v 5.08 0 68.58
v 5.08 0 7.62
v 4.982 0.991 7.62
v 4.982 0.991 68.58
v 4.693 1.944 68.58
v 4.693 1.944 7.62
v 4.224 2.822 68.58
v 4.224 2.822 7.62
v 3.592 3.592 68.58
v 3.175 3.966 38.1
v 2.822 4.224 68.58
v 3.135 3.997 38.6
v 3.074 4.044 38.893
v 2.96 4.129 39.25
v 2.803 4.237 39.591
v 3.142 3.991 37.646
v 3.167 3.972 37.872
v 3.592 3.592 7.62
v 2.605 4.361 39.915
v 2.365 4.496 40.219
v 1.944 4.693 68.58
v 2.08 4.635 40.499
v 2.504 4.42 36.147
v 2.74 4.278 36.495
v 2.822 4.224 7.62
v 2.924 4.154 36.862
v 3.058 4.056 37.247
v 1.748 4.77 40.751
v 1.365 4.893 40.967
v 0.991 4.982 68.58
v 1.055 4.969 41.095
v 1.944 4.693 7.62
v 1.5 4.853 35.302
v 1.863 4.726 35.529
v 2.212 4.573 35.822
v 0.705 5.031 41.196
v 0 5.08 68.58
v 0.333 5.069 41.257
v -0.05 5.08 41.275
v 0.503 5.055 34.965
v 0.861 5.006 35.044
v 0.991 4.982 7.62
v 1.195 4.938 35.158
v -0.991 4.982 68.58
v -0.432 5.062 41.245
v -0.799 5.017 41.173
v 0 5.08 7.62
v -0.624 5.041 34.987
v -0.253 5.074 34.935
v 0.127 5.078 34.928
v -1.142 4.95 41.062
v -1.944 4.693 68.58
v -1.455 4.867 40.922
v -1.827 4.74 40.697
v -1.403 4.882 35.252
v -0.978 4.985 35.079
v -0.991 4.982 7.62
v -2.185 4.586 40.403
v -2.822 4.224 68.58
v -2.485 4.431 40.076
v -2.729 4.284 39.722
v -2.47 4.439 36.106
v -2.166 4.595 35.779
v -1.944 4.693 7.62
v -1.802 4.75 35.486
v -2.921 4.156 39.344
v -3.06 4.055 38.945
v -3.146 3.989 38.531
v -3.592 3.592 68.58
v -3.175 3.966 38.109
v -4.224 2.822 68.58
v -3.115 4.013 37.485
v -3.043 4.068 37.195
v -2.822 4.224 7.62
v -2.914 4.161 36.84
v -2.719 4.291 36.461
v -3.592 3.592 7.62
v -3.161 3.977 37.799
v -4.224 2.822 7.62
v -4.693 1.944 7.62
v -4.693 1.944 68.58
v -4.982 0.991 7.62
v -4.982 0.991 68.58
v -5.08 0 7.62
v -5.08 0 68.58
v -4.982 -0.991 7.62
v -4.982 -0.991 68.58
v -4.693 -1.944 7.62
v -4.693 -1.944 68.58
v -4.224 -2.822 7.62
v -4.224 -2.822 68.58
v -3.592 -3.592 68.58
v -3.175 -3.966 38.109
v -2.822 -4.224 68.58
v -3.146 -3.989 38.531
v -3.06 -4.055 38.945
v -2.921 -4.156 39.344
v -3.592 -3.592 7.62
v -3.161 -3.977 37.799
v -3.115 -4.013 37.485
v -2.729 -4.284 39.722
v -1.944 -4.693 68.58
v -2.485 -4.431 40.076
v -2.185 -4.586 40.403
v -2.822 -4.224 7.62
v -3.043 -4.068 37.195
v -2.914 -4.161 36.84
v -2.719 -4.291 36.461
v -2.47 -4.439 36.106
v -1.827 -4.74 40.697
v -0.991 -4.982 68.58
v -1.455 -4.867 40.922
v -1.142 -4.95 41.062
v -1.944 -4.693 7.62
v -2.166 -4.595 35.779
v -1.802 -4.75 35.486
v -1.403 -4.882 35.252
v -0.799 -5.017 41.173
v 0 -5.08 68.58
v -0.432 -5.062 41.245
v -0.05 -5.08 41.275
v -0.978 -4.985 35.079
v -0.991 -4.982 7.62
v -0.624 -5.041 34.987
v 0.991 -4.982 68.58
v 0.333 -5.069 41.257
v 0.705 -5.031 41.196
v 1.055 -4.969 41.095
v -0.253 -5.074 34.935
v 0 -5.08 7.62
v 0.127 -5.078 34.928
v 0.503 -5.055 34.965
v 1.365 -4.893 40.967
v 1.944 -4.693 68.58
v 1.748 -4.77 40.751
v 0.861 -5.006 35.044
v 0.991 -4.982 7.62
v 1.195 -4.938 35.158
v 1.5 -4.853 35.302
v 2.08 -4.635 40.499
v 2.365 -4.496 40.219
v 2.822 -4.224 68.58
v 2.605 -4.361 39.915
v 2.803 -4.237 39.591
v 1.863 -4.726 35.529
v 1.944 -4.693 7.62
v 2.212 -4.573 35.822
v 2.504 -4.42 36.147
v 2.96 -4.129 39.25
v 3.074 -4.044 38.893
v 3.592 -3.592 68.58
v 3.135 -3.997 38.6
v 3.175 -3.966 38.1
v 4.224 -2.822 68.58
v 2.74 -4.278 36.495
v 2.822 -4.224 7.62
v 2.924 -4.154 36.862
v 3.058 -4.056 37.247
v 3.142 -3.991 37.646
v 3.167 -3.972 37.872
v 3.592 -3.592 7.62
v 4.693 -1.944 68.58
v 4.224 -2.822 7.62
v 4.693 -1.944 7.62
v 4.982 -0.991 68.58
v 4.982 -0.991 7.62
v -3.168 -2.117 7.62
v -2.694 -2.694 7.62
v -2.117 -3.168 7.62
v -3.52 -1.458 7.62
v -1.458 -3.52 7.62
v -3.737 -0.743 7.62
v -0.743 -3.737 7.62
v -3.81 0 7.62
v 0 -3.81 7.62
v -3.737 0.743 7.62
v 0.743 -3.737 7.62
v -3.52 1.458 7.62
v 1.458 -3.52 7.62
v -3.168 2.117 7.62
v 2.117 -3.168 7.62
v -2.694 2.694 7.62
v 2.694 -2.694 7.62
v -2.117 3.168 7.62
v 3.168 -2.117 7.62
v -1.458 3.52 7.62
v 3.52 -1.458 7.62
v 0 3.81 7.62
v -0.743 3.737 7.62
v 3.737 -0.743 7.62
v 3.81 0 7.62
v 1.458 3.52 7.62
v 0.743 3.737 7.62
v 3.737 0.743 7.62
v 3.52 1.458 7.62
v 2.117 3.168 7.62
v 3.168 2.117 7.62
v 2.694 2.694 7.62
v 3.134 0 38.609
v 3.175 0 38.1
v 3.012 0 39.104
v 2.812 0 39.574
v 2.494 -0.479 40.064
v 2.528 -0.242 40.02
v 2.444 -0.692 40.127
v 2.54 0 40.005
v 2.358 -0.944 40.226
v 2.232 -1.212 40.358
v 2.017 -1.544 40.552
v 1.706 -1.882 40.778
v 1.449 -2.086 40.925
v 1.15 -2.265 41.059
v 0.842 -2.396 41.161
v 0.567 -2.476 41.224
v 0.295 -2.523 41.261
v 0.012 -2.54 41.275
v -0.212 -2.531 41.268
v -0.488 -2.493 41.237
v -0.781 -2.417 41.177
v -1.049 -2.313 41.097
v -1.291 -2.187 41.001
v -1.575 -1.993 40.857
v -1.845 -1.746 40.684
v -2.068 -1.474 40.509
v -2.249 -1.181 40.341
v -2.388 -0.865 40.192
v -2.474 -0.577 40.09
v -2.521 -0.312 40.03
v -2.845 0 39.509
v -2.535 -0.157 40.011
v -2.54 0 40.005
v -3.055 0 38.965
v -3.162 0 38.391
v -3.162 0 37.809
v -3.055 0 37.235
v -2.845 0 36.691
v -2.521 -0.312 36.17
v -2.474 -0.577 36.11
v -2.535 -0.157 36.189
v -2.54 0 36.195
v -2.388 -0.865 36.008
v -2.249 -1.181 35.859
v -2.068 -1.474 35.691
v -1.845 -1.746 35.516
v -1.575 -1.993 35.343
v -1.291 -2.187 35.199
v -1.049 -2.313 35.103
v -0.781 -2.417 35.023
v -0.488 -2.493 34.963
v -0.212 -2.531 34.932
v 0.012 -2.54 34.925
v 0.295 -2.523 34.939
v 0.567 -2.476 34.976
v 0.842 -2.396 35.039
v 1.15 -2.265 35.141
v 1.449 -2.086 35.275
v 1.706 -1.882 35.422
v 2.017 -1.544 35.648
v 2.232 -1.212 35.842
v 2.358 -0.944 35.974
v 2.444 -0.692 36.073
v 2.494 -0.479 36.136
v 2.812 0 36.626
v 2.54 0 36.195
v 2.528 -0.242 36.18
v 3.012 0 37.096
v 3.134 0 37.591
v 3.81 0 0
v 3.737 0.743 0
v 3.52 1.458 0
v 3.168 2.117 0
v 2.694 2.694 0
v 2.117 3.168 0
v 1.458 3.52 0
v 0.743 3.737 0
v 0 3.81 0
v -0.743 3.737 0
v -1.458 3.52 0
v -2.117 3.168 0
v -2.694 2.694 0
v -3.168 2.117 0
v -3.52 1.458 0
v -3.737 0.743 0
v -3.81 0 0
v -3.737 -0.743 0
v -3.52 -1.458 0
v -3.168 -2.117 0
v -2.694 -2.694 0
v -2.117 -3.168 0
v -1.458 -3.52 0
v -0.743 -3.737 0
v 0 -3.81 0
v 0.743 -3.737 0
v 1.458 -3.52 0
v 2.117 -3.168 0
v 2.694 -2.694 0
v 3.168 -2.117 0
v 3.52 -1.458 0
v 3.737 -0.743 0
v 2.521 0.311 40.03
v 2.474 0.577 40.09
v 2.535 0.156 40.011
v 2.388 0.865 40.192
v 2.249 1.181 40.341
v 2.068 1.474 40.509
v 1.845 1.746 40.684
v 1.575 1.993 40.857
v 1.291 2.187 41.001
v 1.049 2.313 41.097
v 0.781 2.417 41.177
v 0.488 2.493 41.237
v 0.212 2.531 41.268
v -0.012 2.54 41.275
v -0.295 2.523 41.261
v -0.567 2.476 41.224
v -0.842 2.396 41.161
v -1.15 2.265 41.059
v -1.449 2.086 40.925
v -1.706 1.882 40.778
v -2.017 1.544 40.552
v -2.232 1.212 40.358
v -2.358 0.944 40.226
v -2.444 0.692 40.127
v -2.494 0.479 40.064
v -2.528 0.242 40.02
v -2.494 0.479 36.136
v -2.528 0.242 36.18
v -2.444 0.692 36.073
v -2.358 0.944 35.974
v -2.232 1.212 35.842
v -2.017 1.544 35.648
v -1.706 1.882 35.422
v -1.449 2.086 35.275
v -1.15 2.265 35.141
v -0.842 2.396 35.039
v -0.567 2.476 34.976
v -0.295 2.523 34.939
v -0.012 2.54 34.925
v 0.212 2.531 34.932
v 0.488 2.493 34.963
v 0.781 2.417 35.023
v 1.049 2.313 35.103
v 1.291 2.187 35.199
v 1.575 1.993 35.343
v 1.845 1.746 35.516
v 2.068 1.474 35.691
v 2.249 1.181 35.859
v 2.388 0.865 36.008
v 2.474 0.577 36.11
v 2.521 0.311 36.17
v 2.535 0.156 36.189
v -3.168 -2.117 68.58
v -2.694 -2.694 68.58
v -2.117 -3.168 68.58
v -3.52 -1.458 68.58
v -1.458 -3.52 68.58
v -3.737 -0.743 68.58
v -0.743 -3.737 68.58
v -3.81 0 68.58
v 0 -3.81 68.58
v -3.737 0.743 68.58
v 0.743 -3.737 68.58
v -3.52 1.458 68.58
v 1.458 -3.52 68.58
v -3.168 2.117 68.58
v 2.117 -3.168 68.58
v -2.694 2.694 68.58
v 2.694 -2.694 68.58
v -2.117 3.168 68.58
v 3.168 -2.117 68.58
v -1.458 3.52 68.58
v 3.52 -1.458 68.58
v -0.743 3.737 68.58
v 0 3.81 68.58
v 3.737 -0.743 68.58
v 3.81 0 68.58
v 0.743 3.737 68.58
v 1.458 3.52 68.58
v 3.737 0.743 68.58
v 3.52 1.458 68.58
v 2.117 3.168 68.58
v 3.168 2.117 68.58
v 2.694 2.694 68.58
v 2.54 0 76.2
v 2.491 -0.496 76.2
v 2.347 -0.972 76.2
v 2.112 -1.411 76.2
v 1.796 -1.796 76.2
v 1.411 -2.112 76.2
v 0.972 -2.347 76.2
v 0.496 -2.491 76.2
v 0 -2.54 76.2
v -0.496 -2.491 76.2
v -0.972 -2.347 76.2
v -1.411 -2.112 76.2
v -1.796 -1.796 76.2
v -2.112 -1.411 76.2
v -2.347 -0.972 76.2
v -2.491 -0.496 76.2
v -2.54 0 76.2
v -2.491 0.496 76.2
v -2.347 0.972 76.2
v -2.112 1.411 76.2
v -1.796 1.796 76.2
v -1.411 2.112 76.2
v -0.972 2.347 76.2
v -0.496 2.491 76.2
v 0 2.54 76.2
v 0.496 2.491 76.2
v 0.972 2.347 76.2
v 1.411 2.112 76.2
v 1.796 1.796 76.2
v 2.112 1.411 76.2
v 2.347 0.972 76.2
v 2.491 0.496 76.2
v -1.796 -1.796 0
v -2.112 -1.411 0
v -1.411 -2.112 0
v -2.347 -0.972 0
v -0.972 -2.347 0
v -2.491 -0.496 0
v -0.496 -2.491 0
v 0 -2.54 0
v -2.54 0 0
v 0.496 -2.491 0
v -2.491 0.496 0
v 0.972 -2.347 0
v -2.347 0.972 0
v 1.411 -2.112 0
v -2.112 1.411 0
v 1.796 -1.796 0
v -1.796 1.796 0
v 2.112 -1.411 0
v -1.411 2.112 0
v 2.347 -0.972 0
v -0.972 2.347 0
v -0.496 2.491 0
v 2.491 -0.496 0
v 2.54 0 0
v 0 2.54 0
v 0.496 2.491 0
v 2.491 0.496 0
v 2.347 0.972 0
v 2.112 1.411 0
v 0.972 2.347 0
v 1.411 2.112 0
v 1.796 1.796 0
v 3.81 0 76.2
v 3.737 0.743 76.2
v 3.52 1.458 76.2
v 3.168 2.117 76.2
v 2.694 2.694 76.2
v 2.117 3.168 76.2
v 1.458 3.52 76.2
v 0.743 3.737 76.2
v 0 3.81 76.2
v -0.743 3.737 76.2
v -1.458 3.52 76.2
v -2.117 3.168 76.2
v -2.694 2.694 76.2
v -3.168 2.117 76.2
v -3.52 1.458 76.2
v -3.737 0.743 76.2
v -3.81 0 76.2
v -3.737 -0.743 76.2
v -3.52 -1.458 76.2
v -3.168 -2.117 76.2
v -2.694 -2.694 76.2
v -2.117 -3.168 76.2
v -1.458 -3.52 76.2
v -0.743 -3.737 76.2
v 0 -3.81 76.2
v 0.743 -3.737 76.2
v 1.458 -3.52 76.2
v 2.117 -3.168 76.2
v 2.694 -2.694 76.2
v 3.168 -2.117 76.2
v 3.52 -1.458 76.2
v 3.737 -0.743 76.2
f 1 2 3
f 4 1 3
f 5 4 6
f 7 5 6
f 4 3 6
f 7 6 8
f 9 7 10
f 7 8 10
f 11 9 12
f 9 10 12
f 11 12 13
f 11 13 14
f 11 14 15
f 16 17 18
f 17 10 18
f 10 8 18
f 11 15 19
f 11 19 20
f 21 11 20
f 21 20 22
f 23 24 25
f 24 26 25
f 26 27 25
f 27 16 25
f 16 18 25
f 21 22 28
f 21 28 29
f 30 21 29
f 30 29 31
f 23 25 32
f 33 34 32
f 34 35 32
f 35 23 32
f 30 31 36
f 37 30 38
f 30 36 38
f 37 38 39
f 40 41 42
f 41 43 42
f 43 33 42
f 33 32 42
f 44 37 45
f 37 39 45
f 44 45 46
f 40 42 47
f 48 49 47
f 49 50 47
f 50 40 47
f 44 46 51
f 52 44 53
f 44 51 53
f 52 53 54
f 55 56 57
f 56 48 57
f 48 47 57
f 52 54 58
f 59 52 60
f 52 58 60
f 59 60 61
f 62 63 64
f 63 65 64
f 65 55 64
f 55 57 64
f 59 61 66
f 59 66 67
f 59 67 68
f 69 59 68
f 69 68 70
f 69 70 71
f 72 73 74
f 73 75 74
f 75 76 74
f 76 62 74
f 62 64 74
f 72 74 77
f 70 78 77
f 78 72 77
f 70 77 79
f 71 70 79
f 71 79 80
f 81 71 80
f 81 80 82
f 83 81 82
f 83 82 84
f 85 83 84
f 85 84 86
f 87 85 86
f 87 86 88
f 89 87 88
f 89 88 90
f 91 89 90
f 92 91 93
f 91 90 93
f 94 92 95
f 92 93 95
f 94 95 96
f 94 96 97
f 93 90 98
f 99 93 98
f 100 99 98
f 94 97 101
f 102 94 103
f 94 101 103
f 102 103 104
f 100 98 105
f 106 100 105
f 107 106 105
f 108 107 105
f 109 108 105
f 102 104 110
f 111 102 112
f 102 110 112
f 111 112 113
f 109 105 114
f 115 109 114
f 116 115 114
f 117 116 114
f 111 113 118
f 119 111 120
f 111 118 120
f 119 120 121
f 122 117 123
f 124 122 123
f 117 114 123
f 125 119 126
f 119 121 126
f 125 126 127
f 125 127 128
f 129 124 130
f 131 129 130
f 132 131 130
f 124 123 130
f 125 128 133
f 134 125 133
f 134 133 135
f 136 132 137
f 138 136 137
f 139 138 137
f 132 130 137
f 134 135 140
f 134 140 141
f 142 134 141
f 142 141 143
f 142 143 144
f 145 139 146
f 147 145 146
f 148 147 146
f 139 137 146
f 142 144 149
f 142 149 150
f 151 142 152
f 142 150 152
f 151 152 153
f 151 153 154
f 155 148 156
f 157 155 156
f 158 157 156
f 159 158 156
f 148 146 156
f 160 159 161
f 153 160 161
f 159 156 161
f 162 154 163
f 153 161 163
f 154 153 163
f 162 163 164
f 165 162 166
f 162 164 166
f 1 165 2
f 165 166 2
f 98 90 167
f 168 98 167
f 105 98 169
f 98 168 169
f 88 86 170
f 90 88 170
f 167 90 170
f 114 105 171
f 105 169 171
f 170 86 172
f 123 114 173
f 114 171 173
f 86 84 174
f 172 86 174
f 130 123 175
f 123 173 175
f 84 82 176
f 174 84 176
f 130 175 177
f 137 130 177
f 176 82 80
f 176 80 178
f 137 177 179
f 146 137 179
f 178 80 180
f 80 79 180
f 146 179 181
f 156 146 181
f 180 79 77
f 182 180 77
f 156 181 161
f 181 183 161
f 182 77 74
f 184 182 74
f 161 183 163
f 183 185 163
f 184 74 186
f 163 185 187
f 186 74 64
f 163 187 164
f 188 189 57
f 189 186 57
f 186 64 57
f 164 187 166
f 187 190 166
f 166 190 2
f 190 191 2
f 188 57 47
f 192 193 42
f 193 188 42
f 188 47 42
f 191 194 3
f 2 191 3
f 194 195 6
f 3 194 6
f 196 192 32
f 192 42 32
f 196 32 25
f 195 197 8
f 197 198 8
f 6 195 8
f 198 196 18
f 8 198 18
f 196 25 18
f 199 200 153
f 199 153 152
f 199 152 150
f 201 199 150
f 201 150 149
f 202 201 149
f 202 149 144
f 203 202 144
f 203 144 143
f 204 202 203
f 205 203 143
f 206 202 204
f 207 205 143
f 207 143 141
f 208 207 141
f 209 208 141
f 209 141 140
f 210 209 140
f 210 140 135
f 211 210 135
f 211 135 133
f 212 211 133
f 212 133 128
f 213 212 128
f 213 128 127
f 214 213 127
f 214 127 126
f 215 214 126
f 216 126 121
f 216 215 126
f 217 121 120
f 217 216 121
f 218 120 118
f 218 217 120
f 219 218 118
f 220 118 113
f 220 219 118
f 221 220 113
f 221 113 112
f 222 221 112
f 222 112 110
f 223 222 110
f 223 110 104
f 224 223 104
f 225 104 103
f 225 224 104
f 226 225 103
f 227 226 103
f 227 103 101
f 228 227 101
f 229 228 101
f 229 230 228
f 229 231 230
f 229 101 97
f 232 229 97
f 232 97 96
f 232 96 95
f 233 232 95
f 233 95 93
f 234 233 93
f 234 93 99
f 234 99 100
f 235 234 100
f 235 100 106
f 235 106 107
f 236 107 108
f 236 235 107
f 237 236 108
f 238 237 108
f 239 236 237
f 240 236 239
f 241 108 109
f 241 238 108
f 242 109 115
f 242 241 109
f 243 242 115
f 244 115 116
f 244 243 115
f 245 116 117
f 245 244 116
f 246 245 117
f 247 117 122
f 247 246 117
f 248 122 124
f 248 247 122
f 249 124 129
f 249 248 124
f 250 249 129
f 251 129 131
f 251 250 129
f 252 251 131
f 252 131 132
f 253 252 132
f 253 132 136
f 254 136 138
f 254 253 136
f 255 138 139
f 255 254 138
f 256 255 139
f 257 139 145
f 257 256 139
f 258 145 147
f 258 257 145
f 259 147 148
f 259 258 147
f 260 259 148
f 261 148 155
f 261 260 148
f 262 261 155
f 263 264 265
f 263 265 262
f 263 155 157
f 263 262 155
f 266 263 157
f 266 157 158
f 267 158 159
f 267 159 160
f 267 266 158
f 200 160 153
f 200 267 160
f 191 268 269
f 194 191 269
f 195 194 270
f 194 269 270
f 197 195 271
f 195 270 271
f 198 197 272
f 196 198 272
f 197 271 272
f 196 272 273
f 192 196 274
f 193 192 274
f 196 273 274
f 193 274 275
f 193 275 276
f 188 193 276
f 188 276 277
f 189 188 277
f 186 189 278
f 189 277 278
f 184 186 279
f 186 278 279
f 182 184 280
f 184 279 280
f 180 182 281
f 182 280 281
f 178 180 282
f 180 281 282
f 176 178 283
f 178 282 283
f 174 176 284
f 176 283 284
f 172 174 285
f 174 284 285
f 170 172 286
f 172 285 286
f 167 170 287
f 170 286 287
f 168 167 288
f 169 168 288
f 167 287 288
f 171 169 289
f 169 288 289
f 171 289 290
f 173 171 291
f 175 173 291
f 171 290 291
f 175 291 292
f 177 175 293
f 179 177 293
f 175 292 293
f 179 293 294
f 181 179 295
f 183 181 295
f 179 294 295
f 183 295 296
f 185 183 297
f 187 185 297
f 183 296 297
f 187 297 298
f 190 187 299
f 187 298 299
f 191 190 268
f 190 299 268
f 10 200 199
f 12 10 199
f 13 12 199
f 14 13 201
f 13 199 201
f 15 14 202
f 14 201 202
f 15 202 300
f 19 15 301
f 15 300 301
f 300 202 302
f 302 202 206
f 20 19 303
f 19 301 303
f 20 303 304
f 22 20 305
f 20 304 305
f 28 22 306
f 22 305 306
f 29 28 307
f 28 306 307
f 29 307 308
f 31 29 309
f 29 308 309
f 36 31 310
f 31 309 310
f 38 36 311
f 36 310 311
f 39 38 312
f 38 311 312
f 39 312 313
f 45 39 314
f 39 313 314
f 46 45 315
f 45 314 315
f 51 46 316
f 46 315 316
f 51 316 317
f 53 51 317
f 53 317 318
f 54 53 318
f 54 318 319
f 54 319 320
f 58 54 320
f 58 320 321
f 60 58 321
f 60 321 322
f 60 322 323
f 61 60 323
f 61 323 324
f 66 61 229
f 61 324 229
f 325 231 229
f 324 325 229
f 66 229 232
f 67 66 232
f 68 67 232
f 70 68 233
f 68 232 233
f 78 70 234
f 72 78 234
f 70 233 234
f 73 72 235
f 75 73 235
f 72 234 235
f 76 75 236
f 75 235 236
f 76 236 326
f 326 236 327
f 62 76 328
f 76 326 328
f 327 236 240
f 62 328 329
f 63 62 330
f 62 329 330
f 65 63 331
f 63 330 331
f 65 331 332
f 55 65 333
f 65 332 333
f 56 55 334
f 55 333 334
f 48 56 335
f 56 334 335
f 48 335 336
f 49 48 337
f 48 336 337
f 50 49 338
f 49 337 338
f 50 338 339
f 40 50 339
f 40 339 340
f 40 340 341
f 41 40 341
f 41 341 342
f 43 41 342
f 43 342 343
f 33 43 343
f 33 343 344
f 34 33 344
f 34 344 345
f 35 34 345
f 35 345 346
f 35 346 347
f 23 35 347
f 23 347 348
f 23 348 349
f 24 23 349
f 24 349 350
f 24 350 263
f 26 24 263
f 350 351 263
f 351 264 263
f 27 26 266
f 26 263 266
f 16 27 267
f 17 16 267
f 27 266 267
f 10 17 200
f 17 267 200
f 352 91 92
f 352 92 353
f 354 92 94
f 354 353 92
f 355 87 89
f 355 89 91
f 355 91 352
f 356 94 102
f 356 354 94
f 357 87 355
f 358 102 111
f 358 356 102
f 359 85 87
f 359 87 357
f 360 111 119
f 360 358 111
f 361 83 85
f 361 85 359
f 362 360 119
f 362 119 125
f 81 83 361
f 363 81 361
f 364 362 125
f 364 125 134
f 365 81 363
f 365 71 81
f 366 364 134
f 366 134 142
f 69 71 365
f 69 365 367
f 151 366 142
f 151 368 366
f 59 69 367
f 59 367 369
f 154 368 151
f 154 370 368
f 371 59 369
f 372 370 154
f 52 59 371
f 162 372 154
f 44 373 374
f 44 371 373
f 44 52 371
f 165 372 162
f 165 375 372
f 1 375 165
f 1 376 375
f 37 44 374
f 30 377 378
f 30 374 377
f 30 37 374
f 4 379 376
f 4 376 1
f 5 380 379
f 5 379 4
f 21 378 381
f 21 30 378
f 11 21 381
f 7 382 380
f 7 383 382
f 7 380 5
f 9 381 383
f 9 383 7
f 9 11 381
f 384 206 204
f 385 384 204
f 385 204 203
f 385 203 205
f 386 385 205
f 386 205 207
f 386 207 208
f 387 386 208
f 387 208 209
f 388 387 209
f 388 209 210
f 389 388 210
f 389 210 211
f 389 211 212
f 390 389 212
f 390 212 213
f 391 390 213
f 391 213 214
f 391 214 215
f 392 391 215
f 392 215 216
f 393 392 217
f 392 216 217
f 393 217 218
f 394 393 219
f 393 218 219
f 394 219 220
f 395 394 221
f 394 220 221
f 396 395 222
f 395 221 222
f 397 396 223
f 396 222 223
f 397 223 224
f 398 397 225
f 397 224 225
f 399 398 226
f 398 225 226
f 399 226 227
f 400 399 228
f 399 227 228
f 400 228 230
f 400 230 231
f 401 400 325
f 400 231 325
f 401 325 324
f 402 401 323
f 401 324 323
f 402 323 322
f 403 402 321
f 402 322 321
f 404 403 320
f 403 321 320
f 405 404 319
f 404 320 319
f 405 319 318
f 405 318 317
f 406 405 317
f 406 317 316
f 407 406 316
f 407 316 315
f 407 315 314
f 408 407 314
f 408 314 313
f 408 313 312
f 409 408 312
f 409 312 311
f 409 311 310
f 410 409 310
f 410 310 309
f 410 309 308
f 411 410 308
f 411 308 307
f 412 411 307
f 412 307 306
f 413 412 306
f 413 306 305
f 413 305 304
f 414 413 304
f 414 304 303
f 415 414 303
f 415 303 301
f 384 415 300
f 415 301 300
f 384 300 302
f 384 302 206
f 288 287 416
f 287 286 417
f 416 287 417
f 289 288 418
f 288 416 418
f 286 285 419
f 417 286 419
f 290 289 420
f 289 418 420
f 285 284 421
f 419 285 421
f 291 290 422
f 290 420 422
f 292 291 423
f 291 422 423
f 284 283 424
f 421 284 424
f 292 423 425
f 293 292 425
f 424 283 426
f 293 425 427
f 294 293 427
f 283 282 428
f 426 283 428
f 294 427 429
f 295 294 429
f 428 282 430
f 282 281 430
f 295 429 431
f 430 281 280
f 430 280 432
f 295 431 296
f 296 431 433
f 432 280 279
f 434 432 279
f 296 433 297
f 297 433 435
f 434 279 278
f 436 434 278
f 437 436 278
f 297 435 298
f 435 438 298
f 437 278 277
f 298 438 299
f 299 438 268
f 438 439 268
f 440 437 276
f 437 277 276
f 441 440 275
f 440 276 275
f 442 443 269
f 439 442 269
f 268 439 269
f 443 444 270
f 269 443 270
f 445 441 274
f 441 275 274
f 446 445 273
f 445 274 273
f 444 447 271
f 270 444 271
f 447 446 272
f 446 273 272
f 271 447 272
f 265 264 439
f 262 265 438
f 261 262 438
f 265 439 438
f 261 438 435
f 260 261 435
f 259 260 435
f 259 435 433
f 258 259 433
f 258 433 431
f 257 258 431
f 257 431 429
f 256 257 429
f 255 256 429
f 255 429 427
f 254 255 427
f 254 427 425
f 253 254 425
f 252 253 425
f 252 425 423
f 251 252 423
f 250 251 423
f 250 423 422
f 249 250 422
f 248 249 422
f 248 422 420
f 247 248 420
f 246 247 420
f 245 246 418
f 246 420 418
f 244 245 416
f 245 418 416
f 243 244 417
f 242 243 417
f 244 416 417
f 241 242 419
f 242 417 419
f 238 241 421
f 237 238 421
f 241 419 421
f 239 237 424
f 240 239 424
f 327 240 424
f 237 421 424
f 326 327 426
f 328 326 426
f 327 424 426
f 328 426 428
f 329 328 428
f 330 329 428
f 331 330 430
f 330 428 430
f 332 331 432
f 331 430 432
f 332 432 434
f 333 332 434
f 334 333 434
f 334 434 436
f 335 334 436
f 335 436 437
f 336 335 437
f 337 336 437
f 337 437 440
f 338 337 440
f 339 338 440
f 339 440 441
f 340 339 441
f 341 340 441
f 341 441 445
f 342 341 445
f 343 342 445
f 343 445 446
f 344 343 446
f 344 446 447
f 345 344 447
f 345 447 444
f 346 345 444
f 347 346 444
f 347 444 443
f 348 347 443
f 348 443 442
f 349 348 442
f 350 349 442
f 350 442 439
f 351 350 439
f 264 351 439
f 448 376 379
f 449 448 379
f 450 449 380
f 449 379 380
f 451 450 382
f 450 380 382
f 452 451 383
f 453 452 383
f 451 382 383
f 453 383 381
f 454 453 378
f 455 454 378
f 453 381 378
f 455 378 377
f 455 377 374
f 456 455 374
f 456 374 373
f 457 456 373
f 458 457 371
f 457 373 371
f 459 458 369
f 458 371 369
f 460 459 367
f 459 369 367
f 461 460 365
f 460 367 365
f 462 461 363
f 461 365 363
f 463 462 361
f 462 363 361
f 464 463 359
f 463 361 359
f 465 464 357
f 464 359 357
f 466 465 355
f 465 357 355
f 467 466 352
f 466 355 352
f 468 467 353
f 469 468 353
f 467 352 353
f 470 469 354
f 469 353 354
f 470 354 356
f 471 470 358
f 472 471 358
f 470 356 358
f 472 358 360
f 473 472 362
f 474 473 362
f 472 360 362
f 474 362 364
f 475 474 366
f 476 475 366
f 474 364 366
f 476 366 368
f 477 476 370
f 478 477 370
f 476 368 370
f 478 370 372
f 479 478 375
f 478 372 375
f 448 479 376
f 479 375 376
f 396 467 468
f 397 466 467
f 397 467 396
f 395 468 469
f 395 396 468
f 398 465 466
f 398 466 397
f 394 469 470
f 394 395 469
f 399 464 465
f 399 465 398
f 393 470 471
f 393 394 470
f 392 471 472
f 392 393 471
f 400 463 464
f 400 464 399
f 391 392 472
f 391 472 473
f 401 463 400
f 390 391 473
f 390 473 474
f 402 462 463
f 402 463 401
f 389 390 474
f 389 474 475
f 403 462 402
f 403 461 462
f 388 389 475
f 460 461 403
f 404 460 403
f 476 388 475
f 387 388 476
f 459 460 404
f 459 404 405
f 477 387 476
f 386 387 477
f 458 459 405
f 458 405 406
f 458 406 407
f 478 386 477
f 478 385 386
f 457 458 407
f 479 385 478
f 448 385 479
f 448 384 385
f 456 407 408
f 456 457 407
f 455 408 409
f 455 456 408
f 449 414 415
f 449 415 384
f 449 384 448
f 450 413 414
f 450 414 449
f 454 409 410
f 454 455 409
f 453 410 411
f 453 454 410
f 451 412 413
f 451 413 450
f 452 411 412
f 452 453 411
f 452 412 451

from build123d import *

# Parameters (mm, degrees)
F0_R          = 3.81
F1_DEPTH      = 7.62
F2_R          = 5.08
F3_DEPTH      = 60.96
F4_R          = 3.81
F5_DEPTH      = 7.62
F6_R          = 3.175
F7_DEPTH      = 25.4
F7_DEPTH_BACK = 25.4
F8_R          = 2.54
F9_DEPTH      = 76.201


with BuildPart() as f1:
    # F0 (on Top) → F1 (new body)
    with BuildSketch(Plane.XY):
        Circle(F0_R)
    extrude(amount=F1_DEPTH)

    # F2 (on face) → F3 (join)
    with BuildSketch(Plane.XY.offset(7.62)):
        Circle(F2_R)
    extrude(amount=F3_DEPTH)

    # F4 (on face) → F5 (join)
    with BuildSketch(Plane.XY.offset(68.58)):
        Circle(F4_R)
    extrude(amount=F5_DEPTH)

    # F6 (on Front) → F7 (cut, two sides)
    with BuildSketch(Plane.XZ) as f7_sk:
        with Locations((0, 38.1)):
            Circle(F6_R)
    extrude(amount=-F7_DEPTH, mode=Mode.SUBTRACT)
    extrude(f7_sk.sketch, amount=F7_DEPTH_BACK, mode=Mode.SUBTRACT)

    # F8 (on face) → F9 (cut, through all)
    with BuildSketch(Plane(origin=(0, 0, 0), x_dir=(1, 0, 0), z_dir=(0, 0, -1))):
        Circle(F8_R)
    extrude(amount=-F9_DEPTH, mode=Mode.SUBTRACT)


solid = f1.part
